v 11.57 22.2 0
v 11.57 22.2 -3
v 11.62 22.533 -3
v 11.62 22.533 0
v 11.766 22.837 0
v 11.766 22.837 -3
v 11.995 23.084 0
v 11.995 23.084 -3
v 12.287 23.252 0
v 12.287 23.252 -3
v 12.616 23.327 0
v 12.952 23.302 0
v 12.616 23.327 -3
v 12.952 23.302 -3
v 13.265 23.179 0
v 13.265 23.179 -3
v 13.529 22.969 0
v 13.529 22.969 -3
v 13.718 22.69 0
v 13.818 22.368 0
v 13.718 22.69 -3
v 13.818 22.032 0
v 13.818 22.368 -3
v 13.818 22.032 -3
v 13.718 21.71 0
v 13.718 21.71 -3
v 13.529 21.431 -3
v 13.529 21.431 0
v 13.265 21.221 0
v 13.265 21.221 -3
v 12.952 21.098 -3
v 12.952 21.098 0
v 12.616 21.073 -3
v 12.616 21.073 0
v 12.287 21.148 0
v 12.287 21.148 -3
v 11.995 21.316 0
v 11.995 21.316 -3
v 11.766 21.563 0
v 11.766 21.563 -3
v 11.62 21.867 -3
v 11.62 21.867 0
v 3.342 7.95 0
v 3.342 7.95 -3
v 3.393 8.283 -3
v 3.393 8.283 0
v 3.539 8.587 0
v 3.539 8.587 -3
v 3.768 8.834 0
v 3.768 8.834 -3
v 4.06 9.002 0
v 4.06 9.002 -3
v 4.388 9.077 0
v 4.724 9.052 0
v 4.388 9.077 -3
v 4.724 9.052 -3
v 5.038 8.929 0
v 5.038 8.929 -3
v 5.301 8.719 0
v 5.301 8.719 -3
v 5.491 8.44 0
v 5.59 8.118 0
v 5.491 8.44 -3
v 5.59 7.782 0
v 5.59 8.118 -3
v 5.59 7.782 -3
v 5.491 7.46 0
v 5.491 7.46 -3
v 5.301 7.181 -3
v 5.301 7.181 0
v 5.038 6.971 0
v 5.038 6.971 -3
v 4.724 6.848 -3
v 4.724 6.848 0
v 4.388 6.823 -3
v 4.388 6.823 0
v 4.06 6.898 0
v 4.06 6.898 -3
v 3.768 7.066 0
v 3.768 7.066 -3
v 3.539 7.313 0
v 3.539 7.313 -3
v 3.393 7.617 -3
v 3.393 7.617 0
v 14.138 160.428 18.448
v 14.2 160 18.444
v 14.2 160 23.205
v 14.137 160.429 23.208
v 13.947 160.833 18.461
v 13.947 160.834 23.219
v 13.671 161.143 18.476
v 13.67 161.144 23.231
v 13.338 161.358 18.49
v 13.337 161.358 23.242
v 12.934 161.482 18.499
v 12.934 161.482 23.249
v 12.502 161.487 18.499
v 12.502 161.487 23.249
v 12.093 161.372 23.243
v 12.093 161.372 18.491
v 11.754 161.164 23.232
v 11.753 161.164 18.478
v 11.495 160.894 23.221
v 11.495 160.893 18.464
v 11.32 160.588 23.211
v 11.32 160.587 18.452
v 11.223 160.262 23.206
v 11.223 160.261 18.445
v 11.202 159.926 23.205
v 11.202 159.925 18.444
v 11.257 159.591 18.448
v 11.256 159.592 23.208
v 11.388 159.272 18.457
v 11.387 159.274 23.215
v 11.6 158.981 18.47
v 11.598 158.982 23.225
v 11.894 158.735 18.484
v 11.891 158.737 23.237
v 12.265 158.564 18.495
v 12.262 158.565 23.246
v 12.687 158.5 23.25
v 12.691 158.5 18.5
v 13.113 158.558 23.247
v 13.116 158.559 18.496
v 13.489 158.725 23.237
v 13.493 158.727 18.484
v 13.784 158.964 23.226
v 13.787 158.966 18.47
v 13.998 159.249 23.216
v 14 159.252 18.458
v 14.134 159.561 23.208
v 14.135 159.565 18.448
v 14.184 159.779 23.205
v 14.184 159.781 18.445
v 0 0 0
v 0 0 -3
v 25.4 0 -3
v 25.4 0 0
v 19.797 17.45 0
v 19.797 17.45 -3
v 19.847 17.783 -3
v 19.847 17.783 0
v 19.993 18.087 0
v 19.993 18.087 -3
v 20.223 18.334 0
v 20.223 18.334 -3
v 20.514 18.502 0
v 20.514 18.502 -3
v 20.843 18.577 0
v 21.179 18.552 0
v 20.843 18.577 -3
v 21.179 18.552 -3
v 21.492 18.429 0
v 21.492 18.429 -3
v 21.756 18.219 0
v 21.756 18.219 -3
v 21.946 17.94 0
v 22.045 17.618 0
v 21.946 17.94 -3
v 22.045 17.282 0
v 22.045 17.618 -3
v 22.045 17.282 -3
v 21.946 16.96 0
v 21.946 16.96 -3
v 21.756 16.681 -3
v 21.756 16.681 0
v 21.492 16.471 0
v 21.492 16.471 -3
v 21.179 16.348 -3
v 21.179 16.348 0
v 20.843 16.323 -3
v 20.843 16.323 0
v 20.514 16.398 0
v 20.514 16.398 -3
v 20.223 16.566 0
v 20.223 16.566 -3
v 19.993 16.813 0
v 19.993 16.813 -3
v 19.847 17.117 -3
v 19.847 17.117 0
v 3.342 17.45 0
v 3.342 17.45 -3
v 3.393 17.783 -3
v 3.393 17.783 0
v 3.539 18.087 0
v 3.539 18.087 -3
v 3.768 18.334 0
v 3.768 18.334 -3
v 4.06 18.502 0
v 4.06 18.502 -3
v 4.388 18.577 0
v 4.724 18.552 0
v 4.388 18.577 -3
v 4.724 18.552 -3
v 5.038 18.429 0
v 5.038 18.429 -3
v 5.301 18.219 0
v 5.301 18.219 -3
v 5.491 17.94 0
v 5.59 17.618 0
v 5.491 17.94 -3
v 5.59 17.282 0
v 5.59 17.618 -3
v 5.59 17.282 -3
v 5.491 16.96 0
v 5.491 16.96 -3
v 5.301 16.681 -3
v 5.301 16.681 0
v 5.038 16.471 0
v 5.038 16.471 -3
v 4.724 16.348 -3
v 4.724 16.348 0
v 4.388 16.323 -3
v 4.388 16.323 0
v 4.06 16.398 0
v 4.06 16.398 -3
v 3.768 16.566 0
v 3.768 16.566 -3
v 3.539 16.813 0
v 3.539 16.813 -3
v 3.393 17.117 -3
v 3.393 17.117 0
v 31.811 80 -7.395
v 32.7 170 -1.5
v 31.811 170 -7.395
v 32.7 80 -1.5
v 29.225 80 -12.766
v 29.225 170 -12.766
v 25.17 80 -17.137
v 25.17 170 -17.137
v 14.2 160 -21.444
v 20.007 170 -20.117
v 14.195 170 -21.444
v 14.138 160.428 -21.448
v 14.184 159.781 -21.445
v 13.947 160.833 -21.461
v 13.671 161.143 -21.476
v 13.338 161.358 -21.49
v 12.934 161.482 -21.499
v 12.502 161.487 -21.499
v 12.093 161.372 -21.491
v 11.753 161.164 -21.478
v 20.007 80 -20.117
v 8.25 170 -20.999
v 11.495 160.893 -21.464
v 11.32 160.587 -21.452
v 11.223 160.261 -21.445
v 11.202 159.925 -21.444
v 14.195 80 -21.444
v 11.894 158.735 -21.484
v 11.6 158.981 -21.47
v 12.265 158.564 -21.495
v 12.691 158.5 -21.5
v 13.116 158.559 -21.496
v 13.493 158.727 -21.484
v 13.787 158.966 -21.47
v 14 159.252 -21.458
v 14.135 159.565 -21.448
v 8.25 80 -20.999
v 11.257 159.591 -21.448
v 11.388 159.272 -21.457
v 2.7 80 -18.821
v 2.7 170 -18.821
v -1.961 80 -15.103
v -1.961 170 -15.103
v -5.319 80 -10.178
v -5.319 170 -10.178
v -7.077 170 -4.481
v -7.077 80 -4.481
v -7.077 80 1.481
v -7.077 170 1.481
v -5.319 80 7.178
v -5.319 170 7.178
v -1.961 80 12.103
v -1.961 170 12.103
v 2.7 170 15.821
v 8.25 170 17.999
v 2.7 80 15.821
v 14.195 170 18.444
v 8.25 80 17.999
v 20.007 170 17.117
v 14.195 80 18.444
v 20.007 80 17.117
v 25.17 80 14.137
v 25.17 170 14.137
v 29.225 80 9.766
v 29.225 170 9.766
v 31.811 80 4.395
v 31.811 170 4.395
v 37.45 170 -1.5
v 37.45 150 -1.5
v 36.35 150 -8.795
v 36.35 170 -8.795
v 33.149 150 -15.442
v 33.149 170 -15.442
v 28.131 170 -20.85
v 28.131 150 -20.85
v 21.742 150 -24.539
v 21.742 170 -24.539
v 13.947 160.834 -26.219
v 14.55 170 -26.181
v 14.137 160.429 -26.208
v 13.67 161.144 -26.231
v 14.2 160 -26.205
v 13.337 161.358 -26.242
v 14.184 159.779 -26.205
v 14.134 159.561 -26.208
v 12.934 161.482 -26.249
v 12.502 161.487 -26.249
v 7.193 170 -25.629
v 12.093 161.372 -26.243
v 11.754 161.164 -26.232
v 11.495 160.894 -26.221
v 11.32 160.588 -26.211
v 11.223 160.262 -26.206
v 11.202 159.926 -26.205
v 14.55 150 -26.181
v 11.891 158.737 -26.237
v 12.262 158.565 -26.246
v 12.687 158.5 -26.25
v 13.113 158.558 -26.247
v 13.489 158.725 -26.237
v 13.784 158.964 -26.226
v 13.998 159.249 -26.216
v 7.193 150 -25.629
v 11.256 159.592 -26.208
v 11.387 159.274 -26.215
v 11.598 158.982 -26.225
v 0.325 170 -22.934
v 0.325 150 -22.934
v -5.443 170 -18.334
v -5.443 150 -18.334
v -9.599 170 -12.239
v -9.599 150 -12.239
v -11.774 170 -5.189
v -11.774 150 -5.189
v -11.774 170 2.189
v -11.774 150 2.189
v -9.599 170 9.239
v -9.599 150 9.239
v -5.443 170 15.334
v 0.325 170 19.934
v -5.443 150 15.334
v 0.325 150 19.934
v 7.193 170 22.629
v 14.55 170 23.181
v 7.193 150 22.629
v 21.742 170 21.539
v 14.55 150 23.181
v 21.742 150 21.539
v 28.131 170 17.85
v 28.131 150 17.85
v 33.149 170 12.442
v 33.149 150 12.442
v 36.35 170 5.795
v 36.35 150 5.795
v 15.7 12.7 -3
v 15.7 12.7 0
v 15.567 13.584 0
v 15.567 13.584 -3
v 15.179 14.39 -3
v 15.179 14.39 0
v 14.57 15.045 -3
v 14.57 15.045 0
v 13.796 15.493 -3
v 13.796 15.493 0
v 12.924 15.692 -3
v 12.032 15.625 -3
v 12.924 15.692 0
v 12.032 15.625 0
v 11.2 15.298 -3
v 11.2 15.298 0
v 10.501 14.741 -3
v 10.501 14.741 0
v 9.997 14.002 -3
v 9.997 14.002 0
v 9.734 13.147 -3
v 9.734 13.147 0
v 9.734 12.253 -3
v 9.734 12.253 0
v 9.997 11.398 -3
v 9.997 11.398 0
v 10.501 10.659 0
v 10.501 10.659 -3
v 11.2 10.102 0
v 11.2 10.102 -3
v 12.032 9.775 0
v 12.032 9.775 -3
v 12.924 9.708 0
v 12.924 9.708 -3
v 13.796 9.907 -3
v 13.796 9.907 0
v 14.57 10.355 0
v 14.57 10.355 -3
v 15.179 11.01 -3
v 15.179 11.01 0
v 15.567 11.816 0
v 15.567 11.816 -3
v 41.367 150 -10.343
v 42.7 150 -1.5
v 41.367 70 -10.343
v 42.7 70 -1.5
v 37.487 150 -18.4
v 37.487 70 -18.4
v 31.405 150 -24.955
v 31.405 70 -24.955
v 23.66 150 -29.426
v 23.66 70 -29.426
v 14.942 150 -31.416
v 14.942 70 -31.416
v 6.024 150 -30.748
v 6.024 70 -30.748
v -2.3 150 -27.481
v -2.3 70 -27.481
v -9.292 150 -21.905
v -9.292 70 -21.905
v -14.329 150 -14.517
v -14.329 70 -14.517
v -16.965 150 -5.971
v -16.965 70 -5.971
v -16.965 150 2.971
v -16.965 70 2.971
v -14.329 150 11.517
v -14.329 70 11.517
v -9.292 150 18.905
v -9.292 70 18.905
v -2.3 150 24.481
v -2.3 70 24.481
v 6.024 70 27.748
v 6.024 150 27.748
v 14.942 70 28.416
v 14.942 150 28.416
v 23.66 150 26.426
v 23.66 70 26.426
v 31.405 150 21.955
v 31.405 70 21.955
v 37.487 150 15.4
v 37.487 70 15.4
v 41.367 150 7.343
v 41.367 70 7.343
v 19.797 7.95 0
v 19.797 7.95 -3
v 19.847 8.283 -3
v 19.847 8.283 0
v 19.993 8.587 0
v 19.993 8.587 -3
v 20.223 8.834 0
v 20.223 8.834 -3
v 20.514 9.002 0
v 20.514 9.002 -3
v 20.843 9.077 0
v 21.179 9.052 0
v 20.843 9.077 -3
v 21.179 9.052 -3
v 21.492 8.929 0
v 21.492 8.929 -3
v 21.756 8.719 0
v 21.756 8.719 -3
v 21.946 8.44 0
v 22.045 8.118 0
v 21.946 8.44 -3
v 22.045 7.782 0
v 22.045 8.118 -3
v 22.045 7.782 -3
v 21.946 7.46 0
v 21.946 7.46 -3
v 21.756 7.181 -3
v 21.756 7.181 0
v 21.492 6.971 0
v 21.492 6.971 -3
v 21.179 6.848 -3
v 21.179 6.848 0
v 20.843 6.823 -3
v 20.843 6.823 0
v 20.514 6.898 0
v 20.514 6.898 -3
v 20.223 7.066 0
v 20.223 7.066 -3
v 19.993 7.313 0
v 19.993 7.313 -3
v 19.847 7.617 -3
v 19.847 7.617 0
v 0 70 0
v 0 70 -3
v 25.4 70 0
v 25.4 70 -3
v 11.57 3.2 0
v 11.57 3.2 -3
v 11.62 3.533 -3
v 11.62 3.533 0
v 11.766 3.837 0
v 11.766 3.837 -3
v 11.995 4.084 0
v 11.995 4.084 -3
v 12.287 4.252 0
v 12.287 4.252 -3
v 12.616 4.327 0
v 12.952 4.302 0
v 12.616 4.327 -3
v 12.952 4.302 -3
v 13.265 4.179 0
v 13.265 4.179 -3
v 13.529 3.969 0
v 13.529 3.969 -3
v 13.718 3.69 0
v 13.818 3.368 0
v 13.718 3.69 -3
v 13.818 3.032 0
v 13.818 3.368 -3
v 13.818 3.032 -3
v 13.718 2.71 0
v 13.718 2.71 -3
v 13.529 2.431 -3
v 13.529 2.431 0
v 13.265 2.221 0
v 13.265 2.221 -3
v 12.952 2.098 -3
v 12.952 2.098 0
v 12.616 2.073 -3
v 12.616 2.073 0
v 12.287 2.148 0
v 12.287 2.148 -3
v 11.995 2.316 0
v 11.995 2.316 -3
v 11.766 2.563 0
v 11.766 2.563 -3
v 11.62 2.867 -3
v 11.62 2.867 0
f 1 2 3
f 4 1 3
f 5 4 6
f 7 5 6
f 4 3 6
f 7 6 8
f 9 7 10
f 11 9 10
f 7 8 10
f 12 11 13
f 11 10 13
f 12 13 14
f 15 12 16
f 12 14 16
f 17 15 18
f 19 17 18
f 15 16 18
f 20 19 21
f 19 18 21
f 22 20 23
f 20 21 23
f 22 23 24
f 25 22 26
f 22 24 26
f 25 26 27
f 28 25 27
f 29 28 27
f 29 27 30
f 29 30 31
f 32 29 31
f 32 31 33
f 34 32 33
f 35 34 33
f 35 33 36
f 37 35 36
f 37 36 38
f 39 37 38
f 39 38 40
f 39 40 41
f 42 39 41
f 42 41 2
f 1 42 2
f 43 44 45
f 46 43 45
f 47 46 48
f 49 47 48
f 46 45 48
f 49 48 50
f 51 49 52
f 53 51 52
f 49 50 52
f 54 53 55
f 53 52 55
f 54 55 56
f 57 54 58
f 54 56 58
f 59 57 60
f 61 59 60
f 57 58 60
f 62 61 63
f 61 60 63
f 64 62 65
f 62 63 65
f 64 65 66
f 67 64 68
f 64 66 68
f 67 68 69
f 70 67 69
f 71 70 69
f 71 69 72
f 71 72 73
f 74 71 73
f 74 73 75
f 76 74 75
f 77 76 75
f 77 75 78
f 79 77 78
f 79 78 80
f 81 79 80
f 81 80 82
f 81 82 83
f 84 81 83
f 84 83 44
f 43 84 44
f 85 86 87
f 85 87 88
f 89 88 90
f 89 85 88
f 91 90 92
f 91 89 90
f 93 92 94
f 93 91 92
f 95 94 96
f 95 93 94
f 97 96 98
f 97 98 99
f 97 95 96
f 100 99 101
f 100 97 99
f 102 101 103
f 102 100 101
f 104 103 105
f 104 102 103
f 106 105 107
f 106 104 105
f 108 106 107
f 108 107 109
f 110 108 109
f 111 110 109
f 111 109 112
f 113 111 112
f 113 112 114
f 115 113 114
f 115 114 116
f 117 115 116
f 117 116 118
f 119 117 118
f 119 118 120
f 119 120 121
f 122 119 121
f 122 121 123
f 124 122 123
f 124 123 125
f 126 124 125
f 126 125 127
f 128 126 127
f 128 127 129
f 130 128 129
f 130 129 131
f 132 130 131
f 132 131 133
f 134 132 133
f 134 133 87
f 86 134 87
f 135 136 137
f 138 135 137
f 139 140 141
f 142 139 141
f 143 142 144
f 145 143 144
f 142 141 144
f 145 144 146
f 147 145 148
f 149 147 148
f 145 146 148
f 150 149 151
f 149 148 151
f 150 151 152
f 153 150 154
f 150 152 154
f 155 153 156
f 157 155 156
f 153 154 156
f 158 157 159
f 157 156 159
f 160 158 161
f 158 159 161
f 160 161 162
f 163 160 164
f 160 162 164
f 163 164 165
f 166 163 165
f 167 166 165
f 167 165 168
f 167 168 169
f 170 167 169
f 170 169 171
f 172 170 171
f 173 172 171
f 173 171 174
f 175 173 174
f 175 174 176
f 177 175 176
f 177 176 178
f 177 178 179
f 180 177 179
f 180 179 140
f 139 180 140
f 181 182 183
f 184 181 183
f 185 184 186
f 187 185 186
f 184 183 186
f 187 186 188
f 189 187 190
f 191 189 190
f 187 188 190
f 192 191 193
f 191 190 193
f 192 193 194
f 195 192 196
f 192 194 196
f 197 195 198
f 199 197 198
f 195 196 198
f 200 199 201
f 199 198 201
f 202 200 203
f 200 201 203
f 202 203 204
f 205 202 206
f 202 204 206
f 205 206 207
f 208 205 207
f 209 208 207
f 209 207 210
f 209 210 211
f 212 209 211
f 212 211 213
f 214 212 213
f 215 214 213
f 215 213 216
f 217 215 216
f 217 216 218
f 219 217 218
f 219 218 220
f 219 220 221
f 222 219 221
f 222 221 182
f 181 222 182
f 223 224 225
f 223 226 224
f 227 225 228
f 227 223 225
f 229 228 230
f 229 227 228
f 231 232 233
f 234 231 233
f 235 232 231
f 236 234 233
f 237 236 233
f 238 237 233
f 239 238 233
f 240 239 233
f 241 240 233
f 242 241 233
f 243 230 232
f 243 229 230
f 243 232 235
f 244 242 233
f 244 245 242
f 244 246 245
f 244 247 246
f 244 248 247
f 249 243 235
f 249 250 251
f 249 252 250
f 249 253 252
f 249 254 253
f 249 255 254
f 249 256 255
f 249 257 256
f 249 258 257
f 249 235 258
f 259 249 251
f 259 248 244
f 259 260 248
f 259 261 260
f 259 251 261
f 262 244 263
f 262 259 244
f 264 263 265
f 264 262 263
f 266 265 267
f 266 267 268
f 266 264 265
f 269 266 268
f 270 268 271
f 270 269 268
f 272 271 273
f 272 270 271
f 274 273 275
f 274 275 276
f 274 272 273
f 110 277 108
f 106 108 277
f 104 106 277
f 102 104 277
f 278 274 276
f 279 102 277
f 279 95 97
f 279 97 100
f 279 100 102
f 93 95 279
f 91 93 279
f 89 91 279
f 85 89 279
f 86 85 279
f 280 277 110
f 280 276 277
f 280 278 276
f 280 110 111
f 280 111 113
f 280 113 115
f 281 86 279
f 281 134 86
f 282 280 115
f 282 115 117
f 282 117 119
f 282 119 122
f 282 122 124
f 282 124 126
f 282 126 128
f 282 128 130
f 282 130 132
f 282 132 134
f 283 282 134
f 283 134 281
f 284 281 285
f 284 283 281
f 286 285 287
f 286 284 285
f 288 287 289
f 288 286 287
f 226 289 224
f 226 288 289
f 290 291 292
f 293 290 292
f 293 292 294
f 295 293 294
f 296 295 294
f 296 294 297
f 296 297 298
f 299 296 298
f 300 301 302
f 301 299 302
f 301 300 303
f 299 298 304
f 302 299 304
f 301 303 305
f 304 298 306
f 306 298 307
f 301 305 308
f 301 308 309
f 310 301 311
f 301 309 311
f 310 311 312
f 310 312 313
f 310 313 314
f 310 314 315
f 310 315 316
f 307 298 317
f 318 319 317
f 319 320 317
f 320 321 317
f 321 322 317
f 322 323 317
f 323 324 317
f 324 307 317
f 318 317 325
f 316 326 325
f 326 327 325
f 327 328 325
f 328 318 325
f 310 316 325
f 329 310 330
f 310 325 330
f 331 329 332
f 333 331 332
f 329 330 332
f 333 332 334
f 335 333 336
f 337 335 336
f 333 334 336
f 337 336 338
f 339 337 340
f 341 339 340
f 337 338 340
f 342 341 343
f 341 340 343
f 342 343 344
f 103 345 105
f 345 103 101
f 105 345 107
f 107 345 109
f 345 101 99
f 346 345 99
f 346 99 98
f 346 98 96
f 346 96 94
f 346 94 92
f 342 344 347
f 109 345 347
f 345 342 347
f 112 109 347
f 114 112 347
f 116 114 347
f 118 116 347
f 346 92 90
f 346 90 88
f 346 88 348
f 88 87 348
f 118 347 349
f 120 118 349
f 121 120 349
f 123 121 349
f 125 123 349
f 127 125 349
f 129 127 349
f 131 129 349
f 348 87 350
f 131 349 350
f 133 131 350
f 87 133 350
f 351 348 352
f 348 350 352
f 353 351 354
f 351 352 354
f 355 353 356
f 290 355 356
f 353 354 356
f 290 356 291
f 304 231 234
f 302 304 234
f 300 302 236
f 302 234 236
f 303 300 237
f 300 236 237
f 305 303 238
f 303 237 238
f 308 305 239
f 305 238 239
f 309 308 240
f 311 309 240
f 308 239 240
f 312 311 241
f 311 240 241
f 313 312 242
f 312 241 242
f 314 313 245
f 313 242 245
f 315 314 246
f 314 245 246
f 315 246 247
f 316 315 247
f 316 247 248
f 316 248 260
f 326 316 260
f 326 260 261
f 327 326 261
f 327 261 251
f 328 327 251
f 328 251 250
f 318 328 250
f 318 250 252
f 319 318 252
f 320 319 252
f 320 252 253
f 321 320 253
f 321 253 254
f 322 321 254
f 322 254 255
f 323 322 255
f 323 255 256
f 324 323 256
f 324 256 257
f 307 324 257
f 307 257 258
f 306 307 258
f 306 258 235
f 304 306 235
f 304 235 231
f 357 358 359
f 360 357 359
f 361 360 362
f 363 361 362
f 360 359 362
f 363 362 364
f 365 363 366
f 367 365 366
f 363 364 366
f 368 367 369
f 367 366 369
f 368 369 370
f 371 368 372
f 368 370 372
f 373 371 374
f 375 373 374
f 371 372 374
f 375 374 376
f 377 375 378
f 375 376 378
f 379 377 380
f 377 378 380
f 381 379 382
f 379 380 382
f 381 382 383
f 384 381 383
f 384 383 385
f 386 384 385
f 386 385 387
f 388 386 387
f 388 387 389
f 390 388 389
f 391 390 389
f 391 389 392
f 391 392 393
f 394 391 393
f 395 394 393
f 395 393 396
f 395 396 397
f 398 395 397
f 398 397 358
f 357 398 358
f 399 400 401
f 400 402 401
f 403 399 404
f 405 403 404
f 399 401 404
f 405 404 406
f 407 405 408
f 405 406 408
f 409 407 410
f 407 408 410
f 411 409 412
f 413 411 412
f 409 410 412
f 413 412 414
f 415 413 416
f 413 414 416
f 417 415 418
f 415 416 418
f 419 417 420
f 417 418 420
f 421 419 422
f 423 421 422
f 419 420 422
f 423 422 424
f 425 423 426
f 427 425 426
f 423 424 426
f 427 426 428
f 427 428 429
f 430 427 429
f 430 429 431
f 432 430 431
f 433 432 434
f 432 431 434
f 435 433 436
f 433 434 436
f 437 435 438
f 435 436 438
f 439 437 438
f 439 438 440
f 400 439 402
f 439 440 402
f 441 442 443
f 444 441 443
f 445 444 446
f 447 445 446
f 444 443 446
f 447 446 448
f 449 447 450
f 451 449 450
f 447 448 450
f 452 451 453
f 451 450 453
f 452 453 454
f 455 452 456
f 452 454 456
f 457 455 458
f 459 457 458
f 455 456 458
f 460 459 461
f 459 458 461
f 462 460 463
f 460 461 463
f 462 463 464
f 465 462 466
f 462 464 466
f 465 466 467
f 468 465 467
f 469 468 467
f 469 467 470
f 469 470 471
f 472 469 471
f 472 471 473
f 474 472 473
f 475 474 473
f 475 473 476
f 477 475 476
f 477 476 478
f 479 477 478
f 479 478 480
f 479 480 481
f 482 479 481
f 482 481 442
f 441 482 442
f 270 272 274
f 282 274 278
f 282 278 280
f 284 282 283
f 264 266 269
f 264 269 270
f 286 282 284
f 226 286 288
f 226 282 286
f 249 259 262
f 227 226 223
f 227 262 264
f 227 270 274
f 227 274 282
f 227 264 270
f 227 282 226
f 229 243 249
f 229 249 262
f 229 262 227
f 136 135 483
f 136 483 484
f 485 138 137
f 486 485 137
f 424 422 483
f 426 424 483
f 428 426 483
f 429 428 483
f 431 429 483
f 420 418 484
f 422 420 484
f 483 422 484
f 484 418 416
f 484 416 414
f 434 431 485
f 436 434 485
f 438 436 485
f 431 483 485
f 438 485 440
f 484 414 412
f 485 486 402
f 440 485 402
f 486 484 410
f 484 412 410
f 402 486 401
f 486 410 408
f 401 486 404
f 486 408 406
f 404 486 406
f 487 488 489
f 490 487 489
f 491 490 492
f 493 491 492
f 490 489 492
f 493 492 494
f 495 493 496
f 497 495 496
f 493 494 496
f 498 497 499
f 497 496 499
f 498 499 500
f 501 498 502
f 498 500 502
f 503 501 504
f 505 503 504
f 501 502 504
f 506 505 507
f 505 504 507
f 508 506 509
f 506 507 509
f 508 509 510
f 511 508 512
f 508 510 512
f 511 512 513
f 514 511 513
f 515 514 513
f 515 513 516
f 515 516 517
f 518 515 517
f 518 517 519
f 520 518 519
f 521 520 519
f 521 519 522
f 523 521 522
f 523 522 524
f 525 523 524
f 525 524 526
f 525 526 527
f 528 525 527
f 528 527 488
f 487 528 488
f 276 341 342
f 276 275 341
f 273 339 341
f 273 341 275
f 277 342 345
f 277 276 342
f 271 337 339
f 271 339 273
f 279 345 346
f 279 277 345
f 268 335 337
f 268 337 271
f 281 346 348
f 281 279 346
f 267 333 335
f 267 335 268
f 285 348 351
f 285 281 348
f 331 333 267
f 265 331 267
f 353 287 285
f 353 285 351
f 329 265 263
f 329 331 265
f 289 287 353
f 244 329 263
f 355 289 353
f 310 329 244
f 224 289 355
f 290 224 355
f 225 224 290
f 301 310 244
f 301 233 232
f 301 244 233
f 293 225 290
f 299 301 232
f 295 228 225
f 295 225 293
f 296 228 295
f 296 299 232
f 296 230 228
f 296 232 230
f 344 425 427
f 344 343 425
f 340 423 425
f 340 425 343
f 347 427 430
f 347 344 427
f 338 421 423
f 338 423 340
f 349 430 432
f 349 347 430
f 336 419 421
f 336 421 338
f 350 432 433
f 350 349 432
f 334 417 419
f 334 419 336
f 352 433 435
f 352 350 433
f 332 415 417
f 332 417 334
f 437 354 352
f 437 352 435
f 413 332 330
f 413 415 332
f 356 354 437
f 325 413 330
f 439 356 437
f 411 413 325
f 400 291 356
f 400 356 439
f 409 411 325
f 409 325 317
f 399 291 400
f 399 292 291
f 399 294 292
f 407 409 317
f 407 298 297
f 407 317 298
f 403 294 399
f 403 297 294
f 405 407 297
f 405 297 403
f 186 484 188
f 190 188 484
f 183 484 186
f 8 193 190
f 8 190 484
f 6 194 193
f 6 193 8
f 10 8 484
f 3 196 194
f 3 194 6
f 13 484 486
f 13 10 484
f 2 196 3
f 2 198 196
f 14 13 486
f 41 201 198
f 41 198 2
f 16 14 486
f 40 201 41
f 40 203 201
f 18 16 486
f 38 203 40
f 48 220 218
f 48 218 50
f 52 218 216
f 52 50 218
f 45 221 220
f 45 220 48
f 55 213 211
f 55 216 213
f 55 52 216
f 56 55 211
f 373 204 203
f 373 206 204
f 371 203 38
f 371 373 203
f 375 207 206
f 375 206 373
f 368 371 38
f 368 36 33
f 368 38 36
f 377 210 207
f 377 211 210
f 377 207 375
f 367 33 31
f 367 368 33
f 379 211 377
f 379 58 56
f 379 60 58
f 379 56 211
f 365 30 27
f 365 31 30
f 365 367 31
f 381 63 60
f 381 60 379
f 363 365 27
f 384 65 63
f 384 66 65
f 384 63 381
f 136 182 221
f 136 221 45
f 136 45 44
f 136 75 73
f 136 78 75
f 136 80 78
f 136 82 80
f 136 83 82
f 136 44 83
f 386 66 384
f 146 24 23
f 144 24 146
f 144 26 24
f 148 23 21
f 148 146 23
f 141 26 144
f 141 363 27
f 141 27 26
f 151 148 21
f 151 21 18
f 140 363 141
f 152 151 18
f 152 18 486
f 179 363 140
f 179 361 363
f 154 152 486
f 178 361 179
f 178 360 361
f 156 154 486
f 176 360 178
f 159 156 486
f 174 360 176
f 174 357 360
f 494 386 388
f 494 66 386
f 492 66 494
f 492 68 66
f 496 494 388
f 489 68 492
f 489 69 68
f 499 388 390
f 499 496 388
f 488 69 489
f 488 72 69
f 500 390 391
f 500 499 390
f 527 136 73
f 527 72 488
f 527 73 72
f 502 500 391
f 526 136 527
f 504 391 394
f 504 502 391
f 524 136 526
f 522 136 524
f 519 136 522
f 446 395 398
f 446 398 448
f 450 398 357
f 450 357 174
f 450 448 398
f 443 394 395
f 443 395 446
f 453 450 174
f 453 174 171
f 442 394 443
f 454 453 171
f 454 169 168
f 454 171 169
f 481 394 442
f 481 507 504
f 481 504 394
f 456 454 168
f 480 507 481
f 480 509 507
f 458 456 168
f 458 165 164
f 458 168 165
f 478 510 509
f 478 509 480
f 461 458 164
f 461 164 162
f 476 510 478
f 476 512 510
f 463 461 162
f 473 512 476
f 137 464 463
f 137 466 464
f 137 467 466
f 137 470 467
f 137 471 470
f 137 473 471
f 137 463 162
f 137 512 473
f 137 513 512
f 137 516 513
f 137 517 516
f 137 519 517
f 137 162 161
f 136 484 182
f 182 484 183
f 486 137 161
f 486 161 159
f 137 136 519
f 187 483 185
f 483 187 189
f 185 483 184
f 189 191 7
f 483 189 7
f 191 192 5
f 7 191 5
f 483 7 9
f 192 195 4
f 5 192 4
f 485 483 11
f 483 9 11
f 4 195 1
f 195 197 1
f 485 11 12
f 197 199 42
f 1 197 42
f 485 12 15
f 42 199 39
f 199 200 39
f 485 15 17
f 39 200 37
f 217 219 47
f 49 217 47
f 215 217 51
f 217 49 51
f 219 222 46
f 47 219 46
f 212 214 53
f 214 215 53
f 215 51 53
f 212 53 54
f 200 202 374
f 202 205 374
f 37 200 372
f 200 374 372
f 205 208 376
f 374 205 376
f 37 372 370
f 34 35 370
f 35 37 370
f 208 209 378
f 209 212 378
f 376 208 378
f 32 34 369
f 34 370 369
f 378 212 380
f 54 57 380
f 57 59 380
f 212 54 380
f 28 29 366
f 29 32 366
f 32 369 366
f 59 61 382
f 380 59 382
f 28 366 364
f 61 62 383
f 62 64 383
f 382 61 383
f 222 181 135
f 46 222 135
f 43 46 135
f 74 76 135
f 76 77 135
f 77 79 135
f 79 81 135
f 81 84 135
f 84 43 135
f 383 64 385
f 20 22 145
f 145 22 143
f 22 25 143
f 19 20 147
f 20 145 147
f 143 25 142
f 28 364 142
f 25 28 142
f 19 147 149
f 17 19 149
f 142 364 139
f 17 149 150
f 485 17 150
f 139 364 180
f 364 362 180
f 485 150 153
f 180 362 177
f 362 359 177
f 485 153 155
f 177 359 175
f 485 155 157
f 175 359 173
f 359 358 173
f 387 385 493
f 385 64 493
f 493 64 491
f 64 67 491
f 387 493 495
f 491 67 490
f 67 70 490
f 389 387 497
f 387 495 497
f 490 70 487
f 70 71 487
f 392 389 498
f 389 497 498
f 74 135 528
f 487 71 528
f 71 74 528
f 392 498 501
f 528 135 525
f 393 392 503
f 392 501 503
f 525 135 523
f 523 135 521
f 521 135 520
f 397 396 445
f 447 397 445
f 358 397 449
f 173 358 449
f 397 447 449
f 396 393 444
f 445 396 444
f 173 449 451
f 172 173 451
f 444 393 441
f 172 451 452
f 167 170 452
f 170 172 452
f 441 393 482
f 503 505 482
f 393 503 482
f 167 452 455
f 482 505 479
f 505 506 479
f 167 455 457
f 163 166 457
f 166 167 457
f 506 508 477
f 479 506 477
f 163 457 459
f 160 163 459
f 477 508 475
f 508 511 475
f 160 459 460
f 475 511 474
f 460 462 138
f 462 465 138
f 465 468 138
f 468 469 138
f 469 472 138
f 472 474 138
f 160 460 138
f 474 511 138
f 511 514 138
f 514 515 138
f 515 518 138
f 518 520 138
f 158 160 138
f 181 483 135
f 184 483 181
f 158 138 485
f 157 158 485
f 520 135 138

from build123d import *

# Parameters (mm, degrees)
SKETCH2_W                 = 25.4
SKETCH2_H                 = 3
BOSS_EXTRUDE1_DEPTH       = 70
SKETCH4_R                 = 30
BOSS_EXTRUDE2_DEPTH       = 10
SKETCH5_R                 = 30
SKETCH5_R_2               = 20
BOSS_EXTRUDE3_DEPTH       = 70
SKETCH8_R                 = 24.75
SKETCH8_R_2               = 20
BOSS_EXTRUDE4_DEPTH       = 20
SKETCH9_R                 = 1.5
CUT_EXTRUDE4_DEPTH        = 29.5
CUT_EXTRUDE4_DEPTH_BACK   = 32.5
F_4_40_TAPPED_HOLE1_D     = 2.2606
F_4_40_TAPPED_HOLE1_DEPTH = 7.6
F_4_40_TAPPED_HOLE1_TIP   = 0.679152758
SKETCH3_R                 = 3
CUT_EXTRUDE5_DEPTH        = 10


with BuildPart() as part:
    # Sketch2 → Boss-Extrude1 (new body)
    with BuildSketch(Plane(origin=(0, 0, 0), x_dir=(1, 0, 0), z_dir=(0, 1, 0))):
        with Locations((12.7, 1.5)):
            Rectangle(SKETCH2_W, SKETCH2_H)
    extrude(amount=BOSS_EXTRUDE1_DEPTH)

    # Sketch4 → Boss-Extrude2 (add)
    with BuildSketch(Plane(origin=(0, 70, 0), x_dir=(1, 0, 0), z_dir=(0, 1, 0))):
        with Locations((12.7, 1.5)):
            Circle(SKETCH4_R)
    extrude(amount=BOSS_EXTRUDE2_DEPTH)

    # Sketch5 → Boss-Extrude3 (add)
    with BuildSketch(Plane(origin=(0, 80, 0), x_dir=(1, 0, 0), z_dir=(0, 1, 0))):
        with Locations((12.7, 1.5)):
            Circle(SKETCH5_R)
        with Locations((12.7, 1.5)):
            Circle(SKETCH5_R_2, mode=Mode.SUBTRACT)
    extrude(amount=BOSS_EXTRUDE3_DEPTH)

    # Sketch8 → Boss-Extrude4 (add)
    with BuildSketch(Plane(origin=(0, 150, 0), x_dir=(1, 0, 0), z_dir=(0, 1, 0))):
        with Locations((12.7, 1.5)):
            Circle(SKETCH8_R)
        with Locations((12.7, 1.5)):
            Circle(SKETCH8_R_2, mode=Mode.SUBTRACT)
    extrude(amount=BOSS_EXTRUDE4_DEPTH)

    # Sketch9 → Cut-Extrude4 (cut, two sides)
    with BuildSketch(Plane.XY) as cut_extrude4_sk:
        with Locations((12.7, 160)):
            Circle(SKETCH9_R)
    extrude(amount=CUT_EXTRUDE4_DEPTH, mode=Mode.SUBTRACT)
    extrude(cut_extrude4_sk.sketch, amount=-CUT_EXTRUDE4_DEPTH_BACK, mode=Mode.SUBTRACT)

    # #4-40 Tapped Hole1
    with Locations(Plane.XY):
        with Locations((12.7, 22.2), (20.927241336, 17.45), (20.927241336, 7.95), (12.7, 3.2), (4.472758664, 7.95), (4.472758664, 17.45)):
            Hole(F_4_40_TAPPED_HOLE1_D / 2, depth=F_4_40_TAPPED_HOLE1_DEPTH)
            with Locations((0, 0, -(F_4_40_TAPPED_HOLE1_DEPTH + F_4_40_TAPPED_HOLE1_TIP / 2))):  # 118° drill point
                Cone(0, F_4_40_TAPPED_HOLE1_D / 2, F_4_40_TAPPED_HOLE1_TIP, mode=Mode.SUBTRACT)

    # Sketch3 → Cut-Extrude5 (cut)
    with BuildSketch(Plane.XY):
        with Locations((12.7, 12.7)):
            Circle(SKETCH3_R)
    extrude(amount=-CUT_EXTRUDE5_DEPTH, mode=Mode.SUBTRACT)


solid = part.part
